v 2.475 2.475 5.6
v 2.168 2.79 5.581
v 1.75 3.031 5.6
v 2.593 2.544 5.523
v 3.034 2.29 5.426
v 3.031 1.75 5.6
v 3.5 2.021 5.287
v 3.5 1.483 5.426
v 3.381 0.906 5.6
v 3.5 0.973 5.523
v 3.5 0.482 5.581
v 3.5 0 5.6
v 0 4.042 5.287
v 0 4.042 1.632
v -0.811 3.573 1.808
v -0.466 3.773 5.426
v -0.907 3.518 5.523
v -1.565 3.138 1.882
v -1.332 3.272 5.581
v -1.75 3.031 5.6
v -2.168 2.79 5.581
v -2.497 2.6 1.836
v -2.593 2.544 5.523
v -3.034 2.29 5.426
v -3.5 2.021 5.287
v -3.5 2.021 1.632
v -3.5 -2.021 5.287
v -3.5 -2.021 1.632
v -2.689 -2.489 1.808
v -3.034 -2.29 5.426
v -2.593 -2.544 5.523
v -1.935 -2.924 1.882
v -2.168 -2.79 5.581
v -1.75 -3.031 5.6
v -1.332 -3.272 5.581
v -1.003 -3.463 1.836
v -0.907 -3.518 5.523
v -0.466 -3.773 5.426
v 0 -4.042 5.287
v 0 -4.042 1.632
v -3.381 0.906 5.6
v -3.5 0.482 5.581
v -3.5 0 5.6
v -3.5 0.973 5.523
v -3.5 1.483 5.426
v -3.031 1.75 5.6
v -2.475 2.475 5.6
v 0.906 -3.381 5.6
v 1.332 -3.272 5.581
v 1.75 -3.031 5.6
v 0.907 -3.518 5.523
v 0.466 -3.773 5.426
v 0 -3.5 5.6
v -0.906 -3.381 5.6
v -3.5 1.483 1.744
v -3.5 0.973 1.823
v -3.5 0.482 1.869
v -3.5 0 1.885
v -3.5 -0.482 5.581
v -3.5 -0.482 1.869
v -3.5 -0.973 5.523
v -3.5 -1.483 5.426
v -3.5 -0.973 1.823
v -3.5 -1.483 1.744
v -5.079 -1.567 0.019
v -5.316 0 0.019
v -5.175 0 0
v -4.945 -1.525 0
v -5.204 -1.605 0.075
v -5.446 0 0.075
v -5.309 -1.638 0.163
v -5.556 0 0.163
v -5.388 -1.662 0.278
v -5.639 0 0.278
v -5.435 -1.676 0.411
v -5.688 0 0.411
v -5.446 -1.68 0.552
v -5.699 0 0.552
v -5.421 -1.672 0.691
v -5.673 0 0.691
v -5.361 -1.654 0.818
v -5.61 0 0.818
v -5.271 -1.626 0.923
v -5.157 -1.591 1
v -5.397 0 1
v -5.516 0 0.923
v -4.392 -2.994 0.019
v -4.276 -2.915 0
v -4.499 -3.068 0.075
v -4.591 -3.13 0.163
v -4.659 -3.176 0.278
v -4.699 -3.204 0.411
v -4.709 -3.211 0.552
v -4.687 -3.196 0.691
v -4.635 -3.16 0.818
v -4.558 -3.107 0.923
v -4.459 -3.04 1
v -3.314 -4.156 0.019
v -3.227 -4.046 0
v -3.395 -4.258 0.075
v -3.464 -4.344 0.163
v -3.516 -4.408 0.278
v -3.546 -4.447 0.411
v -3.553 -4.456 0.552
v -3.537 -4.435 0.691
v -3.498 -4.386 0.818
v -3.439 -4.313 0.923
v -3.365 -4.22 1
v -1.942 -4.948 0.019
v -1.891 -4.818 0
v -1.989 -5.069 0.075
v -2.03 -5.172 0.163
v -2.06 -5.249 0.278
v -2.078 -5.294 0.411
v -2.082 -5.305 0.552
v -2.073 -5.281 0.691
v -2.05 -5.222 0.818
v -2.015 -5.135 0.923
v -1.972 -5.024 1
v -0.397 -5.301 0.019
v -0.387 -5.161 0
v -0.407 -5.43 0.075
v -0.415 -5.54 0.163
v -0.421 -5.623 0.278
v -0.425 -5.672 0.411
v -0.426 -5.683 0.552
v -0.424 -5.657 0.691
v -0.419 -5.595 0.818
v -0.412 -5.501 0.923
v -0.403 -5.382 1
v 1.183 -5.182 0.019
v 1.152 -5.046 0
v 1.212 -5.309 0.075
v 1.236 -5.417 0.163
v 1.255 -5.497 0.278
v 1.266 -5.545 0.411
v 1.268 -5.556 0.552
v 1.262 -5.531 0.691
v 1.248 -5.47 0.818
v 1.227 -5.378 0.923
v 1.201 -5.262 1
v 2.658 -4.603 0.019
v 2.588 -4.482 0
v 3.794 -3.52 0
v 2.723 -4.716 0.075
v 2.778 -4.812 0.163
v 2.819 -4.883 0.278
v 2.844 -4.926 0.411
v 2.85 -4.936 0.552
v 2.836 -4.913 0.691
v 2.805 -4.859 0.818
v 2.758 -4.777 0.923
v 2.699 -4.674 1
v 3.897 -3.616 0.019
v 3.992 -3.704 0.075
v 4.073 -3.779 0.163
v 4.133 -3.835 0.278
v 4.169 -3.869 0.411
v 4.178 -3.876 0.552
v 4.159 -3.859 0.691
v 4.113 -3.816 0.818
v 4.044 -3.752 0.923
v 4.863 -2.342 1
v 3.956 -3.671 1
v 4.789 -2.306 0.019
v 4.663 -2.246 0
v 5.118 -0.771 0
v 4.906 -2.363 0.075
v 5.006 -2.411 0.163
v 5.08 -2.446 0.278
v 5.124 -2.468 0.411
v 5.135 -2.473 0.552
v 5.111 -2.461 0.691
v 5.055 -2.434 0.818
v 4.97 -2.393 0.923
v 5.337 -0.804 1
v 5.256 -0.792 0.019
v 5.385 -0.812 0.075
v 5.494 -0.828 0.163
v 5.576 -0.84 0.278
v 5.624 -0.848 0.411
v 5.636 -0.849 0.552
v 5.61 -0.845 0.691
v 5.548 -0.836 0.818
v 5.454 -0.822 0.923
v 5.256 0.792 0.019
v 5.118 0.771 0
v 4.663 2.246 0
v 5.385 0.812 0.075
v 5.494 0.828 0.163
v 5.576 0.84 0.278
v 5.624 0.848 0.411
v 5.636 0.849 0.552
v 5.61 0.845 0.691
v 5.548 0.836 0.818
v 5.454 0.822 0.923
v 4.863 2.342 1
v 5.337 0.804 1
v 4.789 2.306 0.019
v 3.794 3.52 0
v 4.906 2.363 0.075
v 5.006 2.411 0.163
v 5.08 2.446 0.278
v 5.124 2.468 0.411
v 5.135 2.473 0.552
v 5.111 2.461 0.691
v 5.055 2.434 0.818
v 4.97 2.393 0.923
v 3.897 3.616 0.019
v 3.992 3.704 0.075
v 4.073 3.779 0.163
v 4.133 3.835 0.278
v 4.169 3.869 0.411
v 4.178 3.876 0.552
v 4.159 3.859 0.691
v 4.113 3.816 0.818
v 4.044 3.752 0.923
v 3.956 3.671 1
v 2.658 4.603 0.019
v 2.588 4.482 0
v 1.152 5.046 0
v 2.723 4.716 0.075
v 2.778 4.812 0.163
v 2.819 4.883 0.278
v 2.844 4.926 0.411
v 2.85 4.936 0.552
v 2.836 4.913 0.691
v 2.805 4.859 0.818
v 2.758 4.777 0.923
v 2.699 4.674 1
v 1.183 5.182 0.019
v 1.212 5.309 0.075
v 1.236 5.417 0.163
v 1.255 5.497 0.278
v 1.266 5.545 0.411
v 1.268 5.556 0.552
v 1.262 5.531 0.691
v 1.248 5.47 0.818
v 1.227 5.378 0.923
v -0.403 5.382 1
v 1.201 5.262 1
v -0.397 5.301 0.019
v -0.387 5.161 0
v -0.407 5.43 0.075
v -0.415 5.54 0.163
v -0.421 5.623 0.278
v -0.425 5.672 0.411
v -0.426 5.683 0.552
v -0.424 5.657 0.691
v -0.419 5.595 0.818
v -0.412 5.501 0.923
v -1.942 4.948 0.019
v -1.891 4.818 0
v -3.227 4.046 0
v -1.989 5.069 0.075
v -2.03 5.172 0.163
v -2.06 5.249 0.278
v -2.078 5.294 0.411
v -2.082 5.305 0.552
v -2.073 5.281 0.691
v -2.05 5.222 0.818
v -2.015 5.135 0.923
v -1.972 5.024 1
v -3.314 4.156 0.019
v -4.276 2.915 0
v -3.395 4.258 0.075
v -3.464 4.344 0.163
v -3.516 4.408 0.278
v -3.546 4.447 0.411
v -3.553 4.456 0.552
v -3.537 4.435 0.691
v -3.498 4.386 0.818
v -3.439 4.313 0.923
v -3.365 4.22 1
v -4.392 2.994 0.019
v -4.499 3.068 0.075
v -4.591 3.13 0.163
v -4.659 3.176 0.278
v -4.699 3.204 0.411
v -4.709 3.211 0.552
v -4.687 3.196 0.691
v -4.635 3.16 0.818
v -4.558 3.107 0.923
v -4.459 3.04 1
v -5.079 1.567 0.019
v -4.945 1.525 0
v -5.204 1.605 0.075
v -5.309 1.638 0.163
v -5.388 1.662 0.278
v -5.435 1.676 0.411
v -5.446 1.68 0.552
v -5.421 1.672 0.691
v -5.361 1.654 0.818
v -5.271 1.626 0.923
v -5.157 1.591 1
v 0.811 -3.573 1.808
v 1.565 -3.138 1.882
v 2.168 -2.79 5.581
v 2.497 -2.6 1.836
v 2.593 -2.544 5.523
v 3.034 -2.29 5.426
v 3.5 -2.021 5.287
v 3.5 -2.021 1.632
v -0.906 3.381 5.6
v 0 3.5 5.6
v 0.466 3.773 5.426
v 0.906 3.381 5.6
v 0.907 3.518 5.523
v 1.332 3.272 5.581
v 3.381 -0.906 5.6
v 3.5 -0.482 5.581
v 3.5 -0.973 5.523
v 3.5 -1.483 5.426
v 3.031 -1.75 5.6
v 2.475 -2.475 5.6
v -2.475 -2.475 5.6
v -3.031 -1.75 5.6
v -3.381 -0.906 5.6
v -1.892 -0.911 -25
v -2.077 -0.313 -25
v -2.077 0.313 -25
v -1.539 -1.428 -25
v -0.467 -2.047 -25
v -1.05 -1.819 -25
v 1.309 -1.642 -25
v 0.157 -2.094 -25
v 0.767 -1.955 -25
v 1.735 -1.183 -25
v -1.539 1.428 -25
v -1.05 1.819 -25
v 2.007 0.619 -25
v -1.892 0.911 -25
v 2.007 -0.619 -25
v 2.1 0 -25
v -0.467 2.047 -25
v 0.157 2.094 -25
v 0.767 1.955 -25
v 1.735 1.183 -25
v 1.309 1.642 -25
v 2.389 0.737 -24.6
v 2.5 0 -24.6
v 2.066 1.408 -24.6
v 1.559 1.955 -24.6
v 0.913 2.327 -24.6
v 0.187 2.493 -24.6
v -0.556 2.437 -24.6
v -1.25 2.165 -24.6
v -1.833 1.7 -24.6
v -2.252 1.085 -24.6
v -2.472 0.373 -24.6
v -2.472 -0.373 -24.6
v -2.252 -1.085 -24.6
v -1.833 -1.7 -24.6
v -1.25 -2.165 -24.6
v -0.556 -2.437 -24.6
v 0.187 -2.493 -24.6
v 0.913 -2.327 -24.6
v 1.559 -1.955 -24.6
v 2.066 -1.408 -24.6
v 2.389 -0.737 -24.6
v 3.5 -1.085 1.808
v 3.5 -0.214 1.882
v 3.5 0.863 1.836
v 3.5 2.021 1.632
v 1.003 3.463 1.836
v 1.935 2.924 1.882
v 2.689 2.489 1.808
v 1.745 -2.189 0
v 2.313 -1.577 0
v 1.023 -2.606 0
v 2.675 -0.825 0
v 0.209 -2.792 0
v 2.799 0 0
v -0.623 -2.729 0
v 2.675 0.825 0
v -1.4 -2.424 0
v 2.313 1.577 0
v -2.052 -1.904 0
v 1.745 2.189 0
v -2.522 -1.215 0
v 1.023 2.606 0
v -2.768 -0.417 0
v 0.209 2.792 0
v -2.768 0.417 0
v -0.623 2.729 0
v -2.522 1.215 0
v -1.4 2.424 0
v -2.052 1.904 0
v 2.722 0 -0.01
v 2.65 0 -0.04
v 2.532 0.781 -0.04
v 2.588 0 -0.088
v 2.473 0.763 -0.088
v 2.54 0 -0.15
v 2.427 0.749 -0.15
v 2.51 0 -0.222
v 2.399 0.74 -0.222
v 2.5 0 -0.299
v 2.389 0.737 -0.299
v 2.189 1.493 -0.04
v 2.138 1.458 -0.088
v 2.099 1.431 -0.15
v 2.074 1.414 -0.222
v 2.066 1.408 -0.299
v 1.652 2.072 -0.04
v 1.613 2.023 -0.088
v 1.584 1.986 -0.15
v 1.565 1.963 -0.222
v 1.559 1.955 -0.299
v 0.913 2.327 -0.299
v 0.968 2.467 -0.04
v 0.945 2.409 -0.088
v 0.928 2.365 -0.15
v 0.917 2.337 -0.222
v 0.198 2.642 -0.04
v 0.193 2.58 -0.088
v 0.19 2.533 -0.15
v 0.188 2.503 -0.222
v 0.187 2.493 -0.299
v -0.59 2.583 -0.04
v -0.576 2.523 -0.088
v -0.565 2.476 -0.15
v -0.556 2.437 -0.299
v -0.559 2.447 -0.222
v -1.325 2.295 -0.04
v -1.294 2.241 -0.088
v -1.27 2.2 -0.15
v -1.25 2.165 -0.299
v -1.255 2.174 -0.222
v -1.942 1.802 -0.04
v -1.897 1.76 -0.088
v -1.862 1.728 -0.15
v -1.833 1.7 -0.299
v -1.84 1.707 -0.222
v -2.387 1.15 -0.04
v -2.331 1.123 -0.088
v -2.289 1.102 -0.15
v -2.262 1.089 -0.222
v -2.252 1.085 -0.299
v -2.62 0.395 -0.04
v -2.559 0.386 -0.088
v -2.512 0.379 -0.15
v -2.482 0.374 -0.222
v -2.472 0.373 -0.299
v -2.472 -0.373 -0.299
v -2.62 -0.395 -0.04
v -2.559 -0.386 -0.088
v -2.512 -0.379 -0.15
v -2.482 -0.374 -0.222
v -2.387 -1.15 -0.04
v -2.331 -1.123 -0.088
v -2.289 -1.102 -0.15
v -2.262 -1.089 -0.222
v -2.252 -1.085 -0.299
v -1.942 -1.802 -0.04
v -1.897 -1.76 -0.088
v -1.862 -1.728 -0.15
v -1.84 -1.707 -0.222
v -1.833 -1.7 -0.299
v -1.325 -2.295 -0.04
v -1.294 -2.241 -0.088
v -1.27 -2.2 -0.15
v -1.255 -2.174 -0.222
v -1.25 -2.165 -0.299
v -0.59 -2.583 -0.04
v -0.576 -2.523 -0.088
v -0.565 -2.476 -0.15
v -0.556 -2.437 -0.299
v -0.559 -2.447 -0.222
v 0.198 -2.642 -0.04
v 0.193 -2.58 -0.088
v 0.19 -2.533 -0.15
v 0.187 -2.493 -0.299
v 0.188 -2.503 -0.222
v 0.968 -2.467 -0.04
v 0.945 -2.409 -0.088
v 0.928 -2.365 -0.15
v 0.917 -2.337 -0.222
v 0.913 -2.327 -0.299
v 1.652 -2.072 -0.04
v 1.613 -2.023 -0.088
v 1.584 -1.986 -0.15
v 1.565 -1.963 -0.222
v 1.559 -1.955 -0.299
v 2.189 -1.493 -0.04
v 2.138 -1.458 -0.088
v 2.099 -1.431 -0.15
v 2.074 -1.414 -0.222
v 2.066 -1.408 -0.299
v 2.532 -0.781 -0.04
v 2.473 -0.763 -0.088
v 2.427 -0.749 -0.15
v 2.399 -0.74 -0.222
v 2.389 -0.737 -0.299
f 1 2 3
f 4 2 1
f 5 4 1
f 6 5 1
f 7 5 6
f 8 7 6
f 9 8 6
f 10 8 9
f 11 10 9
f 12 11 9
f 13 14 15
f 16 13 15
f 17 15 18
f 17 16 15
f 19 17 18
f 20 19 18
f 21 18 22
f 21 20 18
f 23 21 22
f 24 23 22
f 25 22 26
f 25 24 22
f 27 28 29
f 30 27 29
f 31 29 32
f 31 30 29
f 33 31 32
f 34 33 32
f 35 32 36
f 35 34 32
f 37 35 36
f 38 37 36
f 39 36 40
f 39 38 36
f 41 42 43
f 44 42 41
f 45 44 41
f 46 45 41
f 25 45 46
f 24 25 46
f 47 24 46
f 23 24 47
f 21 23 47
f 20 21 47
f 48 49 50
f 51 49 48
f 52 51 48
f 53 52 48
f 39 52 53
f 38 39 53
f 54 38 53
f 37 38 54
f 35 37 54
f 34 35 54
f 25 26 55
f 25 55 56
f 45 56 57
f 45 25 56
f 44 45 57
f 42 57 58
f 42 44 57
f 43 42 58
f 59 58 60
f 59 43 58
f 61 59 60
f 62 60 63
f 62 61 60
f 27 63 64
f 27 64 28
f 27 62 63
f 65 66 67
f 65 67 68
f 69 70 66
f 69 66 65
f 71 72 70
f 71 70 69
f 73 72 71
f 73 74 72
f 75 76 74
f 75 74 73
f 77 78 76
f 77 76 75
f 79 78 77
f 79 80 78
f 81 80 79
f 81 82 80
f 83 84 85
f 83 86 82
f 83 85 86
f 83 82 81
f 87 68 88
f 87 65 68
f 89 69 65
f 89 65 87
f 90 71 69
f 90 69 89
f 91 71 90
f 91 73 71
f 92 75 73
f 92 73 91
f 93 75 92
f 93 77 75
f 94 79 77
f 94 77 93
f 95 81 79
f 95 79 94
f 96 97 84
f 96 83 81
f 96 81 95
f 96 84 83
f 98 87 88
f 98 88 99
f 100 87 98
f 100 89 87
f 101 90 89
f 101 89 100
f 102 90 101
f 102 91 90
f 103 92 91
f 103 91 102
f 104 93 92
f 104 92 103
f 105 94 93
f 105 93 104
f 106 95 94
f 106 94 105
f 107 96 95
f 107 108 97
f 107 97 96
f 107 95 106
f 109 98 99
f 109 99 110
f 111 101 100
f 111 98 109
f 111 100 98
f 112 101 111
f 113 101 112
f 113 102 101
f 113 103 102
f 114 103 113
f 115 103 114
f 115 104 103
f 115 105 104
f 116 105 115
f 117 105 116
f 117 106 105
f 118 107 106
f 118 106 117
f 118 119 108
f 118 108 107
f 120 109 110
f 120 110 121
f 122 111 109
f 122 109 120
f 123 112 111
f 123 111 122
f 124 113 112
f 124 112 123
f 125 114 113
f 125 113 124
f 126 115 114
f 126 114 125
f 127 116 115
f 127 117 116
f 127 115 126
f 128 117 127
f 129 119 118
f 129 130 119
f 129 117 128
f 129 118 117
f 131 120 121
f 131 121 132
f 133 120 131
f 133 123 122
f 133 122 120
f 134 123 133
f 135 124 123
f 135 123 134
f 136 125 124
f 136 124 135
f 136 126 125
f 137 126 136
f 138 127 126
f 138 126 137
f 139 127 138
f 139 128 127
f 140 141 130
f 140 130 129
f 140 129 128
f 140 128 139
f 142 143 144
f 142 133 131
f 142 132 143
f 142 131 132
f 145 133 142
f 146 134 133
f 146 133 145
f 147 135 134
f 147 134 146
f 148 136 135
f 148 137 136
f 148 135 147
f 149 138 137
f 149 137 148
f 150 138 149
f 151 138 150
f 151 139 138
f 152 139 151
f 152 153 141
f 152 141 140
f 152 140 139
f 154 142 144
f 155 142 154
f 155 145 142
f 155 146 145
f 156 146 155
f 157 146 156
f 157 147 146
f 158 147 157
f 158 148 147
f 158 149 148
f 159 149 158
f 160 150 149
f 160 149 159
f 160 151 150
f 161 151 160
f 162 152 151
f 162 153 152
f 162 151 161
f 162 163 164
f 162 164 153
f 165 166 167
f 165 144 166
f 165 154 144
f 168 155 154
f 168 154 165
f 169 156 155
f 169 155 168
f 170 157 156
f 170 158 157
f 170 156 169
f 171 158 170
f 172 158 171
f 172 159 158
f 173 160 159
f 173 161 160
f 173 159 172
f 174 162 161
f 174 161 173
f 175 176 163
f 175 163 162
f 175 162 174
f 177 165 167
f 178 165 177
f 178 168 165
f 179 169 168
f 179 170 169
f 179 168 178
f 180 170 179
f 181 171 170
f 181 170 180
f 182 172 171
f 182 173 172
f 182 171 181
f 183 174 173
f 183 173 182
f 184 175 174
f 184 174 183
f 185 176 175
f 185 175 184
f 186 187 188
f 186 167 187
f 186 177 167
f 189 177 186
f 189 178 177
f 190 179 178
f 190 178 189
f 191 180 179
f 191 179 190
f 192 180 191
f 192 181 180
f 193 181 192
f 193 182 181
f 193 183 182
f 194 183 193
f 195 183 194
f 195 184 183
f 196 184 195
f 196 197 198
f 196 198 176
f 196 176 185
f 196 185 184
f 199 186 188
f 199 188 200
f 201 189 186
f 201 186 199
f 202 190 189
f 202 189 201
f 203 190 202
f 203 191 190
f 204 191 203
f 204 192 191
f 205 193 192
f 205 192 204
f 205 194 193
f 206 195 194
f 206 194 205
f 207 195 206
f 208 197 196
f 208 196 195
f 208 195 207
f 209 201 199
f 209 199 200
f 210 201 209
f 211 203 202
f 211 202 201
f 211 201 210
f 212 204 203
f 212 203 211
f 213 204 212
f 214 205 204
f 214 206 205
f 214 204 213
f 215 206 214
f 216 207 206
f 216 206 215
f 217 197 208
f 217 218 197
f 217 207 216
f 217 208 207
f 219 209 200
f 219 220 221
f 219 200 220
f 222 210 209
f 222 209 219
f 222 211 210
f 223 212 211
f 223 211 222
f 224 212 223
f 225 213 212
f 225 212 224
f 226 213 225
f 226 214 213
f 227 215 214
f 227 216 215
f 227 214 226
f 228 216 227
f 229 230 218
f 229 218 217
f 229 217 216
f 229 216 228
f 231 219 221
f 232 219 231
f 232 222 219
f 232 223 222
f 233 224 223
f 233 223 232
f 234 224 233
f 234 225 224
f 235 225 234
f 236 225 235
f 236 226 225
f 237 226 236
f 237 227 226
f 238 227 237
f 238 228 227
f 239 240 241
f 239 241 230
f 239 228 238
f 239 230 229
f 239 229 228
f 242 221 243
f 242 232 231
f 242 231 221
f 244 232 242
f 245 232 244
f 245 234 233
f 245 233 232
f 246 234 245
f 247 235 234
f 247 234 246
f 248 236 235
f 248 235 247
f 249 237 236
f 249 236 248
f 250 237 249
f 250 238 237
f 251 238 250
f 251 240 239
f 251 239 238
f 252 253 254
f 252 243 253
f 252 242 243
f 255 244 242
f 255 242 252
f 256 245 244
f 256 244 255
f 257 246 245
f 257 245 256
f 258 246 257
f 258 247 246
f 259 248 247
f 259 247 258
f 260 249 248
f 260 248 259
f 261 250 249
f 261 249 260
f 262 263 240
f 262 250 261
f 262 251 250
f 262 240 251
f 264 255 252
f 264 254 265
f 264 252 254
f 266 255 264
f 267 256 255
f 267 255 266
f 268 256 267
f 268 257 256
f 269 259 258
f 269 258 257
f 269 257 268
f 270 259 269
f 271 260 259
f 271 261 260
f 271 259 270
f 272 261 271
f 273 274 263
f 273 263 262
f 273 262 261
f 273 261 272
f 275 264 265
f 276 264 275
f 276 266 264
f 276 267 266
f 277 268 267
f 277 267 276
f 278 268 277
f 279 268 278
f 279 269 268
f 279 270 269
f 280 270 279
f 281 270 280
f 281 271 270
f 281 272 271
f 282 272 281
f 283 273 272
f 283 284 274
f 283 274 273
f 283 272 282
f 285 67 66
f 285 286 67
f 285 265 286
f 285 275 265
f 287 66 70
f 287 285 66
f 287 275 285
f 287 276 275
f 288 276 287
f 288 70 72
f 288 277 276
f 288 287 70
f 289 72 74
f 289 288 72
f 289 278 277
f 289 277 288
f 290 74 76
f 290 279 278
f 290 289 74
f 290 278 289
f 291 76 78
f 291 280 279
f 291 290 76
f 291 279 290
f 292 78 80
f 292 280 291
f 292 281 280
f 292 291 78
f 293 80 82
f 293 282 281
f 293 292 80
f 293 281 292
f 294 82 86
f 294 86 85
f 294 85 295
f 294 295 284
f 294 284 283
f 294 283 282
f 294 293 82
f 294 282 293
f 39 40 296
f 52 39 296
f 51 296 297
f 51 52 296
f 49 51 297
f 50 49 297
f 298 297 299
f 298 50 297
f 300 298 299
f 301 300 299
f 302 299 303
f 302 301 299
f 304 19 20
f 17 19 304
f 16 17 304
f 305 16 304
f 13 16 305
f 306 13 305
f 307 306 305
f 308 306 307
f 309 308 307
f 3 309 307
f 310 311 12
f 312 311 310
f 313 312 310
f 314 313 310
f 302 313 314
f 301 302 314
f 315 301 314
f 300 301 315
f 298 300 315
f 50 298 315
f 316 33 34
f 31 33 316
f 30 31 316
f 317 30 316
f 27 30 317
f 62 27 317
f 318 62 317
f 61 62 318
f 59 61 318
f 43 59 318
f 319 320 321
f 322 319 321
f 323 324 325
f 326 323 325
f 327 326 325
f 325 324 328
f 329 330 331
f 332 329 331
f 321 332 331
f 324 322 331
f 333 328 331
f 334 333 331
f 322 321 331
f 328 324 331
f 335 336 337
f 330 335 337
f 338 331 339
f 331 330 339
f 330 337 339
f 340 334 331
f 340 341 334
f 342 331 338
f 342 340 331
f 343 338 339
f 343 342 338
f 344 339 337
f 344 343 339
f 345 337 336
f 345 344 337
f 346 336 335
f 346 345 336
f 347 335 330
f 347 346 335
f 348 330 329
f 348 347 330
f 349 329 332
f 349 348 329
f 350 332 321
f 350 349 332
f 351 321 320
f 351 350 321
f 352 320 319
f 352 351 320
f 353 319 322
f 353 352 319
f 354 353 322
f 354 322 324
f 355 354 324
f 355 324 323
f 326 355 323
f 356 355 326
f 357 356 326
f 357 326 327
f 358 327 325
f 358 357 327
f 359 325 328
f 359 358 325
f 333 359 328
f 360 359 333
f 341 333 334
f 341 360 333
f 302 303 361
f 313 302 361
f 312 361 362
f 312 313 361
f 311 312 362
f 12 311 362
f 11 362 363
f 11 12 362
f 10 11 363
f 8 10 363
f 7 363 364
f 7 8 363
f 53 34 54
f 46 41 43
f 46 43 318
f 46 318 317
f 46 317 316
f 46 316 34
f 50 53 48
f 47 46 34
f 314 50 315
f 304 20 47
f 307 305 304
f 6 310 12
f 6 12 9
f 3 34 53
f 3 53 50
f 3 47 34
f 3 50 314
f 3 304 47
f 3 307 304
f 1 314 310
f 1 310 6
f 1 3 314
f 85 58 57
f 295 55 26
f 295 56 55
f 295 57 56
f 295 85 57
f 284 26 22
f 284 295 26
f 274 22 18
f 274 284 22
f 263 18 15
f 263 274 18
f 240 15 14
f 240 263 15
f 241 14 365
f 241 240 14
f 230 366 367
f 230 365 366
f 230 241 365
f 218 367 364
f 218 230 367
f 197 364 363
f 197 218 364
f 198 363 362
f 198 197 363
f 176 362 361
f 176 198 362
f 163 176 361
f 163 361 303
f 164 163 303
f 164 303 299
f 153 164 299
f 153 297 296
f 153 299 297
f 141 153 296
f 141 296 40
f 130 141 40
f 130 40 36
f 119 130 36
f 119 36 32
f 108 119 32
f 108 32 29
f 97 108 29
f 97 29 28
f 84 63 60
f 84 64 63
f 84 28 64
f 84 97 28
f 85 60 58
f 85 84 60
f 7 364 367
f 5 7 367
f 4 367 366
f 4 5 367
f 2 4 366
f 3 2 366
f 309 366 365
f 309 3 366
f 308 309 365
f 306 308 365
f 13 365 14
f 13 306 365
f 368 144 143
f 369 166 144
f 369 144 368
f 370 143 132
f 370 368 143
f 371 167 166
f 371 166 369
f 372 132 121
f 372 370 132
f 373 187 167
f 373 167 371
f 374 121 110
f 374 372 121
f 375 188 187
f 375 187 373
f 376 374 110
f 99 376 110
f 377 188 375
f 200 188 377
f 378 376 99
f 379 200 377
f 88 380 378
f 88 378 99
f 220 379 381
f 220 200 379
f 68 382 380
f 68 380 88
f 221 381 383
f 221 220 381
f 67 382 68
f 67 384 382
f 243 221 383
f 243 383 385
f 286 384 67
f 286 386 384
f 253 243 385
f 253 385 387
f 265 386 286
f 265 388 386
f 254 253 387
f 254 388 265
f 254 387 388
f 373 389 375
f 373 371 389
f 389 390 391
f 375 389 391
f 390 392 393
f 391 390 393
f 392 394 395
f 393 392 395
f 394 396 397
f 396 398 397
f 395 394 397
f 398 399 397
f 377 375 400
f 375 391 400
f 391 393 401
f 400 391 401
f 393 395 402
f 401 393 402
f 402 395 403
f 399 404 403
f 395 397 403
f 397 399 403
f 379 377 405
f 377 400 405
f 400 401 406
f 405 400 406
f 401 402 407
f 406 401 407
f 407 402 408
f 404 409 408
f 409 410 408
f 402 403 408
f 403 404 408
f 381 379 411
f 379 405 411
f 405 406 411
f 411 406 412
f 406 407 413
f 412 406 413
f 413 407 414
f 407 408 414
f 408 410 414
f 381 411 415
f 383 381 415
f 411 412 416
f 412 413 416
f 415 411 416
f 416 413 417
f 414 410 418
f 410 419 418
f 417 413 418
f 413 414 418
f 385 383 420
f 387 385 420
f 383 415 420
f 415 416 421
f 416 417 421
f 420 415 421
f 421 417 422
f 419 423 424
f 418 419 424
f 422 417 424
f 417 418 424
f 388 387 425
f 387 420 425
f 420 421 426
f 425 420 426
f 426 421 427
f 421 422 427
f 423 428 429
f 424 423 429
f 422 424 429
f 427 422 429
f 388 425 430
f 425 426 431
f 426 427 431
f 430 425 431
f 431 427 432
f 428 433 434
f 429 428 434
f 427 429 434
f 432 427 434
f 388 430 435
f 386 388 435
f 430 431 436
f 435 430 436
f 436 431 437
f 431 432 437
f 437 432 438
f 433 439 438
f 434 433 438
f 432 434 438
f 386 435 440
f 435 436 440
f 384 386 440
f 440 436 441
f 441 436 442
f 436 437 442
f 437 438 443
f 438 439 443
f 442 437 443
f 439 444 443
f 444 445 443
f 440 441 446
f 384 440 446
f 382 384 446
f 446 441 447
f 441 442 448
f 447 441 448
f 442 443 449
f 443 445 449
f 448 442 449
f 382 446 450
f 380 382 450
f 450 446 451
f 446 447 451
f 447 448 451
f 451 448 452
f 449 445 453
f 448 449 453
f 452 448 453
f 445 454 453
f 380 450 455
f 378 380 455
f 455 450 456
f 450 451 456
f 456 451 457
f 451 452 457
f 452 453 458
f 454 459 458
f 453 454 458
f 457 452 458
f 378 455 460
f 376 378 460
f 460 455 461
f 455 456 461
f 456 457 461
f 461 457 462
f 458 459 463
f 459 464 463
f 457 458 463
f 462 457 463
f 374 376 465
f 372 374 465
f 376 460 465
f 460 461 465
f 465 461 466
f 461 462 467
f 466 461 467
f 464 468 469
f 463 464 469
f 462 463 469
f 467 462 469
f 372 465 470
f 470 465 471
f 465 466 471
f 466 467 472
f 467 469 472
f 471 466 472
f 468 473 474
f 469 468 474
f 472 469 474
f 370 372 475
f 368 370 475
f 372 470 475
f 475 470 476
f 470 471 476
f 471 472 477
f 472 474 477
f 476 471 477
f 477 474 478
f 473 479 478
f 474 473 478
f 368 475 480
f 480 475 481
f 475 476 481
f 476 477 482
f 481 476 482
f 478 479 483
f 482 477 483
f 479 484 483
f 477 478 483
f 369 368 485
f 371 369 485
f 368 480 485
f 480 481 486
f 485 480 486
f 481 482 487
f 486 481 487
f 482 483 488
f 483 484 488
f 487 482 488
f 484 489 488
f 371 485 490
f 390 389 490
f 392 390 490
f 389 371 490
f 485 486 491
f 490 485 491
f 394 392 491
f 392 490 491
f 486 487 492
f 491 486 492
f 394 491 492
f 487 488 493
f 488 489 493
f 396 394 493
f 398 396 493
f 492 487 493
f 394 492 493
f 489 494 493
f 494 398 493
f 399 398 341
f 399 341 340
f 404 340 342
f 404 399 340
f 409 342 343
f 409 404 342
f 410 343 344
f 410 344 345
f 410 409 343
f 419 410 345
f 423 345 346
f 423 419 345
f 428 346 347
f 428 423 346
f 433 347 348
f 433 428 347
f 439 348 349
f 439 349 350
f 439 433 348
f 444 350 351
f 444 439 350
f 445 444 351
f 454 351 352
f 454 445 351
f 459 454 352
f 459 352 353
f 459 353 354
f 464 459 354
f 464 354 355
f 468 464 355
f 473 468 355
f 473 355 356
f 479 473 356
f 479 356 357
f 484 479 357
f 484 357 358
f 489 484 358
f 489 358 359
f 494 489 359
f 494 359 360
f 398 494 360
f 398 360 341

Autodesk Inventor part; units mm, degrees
ref_plane "WorkPlane12" through (0, 0, 0) normal (0, 0, 1) x (1, 0, 0)
sketch "Boceto1" plane through (0, 0, 0) normal (0, 0, 1) x (1, 0, 0)
  point P0 (0, 0)
sketch "Boceto2" plane through (0, 0, 0) normal (0, 0, 1) x (1, 0, 0)
  circle A0 centre (0, 0) radius 2.5
  dimension "d1" = 5
extrude "Extrusión1" add sketch "Boceto2" against normal blind 25
chamfer "Chaflán1" distance 0.4 angle 45 1 edges at (-2.5, 0, -25)
sketch "Boceto3" plane through (0, 0, 0) normal (0, 0, 1) x (1, 0, 0)
  circle A0 centre (0, 0) radius 3.15
  circle A1 centre (0, 0) radius 2.5 construction
  dimension "d7" = 6.3
extrude "Extrusión2" add sketch "Boceto3" along normal blind 5.6
sketch "Boceto4" plane through (0, 0, 0) normal (0, 1, 0) x (-1, 0, 0)
  line L0 (0, 0) -> (5.1754, 0)
  line L1 (0, 3.5167) -> (0, 0)
  line L2 (5.3971, 1) -> (0, 3.5167)
  line L3 (0, -0.8101) -> (0, 4.2379) projected
  line L4 (-2.5, 0) -> (2.5, 0) projected
  arc A0 (5.1754, 0) -> (5.3971, 1) centre (5.1754, 0.5246) ccw
  dimension "d14" = 25
  dimension "d16" = 1
  dimension "d45" = 5.7
revolve "Revolución1" add sketch "Boceto4" angle 360 about axis through (0, 0, 3.5167) along (0, 0, -1)
fillet "Empalme1" radius 0.2994 1 edges at (-2.5, 0, 0)
sketch "Boceto5" plane through (0, 0, 5.6) normal (0, 0, 1) x (1, 0, 0)
  line L0 (-3.5, 2.0207) -> (-3.5, -2.0207)
  line L1 (0, 4.0415) -> (-3.5, 2.0207)
  line L2 (3.5, 2.0207) -> (0, 4.0415)
  line L3 (3.5, -2.0207) -> (3.5, 2.0207)
  line L4 (0, -4.0415) -> (3.5, -2.0207)
  line L5 (-3.5, -2.0207) -> (0, -4.0415)
  circle A0 centre (0, 0) radius 3.5 construction
  circle A1 centre (0, 0) radius 3.15 construction
  dimension "d20" = 7
  dimension "d35" = 120
  dimension "d36" = 120
extrude "Extrusión3" add sketch "Boceto5" against normal blind 5.6
sketch "Boceto9" plane through (0, 0, 0) normal (1, 0, 0) x (0, 1, 0)
  line L0 (-4.0415, 5.6) -> (-4.0415, 5.2874)
  line L1 (-4.0415, 5.2874) -> (-3.5, 5.6)
  line L2 (-3.5, 5.6) -> (-4.0415, 5.6)
  line L3 (-4.0415, 5.6) -> (-4.0415, 1.6322) projected
  line L4 (-4.0415, 5.6) -> (-2.0207, 5.6) projected
  line L5 (0, -1.12) -> (0, 6.72) projected
  dimension "d28" = 30
  dimension "d29" = 3.5
revolve "Revolución2" cut sketch "Boceto9" angle 360 about axis through (0, 0, -10) along (0, 0, 1)
thread "Rosca1" size "M5x0.8" class "6g" standard "ISO Metric profile" length 16
ref_plane "MSC_PF1" through (0, 0, 0) normal (1, 0, 0) x (0, 1, 0)
ref_plane "MSC_PT1" through (0, 0, 0) normal (0, 0, -1) x (-1, 0, 0)
equation "\"d2\" = NLG"
equation "\"d4\" = msp_z"
equation "\"d5\" = msp_z"
equation "\"d7\" = 0.9 * Smax"
equation "\"d8\" = Kmax"
equation "\"d18\" = msp_r"
equation "\"d20\" = Smax"
equation "\"d21\" = Kmax"
equation "\"d33\" = B"
equation "\"d1\" = NND"
equation "\"d16\" = Cmin"
equation "\"d45\" = 0.5 * Dcmax"
equation "\"d29\" = 0.5 * Smax"
equation "\"NND\" = 5"
equation "\"NLG\" = 25"
equation "\"PTC\" = 0.8"
equation "\"msp_z\" = 0.5 * PTC"
equation "\"Smax\" = 7"
equation "\"Kmax\" = 5.6"
equation "\"Dcmax\" = 11.4"
equation "\"Cmin\" = 1"
equation "\"msp_r\" = 0.0598802 * NND"
equation "\"B\" = 16"
equation "\"THREADDIA\" = NND"
properties part number "ANSI B18.2.3.4M - M5 x 0.8x25" material "Acero, suave"
